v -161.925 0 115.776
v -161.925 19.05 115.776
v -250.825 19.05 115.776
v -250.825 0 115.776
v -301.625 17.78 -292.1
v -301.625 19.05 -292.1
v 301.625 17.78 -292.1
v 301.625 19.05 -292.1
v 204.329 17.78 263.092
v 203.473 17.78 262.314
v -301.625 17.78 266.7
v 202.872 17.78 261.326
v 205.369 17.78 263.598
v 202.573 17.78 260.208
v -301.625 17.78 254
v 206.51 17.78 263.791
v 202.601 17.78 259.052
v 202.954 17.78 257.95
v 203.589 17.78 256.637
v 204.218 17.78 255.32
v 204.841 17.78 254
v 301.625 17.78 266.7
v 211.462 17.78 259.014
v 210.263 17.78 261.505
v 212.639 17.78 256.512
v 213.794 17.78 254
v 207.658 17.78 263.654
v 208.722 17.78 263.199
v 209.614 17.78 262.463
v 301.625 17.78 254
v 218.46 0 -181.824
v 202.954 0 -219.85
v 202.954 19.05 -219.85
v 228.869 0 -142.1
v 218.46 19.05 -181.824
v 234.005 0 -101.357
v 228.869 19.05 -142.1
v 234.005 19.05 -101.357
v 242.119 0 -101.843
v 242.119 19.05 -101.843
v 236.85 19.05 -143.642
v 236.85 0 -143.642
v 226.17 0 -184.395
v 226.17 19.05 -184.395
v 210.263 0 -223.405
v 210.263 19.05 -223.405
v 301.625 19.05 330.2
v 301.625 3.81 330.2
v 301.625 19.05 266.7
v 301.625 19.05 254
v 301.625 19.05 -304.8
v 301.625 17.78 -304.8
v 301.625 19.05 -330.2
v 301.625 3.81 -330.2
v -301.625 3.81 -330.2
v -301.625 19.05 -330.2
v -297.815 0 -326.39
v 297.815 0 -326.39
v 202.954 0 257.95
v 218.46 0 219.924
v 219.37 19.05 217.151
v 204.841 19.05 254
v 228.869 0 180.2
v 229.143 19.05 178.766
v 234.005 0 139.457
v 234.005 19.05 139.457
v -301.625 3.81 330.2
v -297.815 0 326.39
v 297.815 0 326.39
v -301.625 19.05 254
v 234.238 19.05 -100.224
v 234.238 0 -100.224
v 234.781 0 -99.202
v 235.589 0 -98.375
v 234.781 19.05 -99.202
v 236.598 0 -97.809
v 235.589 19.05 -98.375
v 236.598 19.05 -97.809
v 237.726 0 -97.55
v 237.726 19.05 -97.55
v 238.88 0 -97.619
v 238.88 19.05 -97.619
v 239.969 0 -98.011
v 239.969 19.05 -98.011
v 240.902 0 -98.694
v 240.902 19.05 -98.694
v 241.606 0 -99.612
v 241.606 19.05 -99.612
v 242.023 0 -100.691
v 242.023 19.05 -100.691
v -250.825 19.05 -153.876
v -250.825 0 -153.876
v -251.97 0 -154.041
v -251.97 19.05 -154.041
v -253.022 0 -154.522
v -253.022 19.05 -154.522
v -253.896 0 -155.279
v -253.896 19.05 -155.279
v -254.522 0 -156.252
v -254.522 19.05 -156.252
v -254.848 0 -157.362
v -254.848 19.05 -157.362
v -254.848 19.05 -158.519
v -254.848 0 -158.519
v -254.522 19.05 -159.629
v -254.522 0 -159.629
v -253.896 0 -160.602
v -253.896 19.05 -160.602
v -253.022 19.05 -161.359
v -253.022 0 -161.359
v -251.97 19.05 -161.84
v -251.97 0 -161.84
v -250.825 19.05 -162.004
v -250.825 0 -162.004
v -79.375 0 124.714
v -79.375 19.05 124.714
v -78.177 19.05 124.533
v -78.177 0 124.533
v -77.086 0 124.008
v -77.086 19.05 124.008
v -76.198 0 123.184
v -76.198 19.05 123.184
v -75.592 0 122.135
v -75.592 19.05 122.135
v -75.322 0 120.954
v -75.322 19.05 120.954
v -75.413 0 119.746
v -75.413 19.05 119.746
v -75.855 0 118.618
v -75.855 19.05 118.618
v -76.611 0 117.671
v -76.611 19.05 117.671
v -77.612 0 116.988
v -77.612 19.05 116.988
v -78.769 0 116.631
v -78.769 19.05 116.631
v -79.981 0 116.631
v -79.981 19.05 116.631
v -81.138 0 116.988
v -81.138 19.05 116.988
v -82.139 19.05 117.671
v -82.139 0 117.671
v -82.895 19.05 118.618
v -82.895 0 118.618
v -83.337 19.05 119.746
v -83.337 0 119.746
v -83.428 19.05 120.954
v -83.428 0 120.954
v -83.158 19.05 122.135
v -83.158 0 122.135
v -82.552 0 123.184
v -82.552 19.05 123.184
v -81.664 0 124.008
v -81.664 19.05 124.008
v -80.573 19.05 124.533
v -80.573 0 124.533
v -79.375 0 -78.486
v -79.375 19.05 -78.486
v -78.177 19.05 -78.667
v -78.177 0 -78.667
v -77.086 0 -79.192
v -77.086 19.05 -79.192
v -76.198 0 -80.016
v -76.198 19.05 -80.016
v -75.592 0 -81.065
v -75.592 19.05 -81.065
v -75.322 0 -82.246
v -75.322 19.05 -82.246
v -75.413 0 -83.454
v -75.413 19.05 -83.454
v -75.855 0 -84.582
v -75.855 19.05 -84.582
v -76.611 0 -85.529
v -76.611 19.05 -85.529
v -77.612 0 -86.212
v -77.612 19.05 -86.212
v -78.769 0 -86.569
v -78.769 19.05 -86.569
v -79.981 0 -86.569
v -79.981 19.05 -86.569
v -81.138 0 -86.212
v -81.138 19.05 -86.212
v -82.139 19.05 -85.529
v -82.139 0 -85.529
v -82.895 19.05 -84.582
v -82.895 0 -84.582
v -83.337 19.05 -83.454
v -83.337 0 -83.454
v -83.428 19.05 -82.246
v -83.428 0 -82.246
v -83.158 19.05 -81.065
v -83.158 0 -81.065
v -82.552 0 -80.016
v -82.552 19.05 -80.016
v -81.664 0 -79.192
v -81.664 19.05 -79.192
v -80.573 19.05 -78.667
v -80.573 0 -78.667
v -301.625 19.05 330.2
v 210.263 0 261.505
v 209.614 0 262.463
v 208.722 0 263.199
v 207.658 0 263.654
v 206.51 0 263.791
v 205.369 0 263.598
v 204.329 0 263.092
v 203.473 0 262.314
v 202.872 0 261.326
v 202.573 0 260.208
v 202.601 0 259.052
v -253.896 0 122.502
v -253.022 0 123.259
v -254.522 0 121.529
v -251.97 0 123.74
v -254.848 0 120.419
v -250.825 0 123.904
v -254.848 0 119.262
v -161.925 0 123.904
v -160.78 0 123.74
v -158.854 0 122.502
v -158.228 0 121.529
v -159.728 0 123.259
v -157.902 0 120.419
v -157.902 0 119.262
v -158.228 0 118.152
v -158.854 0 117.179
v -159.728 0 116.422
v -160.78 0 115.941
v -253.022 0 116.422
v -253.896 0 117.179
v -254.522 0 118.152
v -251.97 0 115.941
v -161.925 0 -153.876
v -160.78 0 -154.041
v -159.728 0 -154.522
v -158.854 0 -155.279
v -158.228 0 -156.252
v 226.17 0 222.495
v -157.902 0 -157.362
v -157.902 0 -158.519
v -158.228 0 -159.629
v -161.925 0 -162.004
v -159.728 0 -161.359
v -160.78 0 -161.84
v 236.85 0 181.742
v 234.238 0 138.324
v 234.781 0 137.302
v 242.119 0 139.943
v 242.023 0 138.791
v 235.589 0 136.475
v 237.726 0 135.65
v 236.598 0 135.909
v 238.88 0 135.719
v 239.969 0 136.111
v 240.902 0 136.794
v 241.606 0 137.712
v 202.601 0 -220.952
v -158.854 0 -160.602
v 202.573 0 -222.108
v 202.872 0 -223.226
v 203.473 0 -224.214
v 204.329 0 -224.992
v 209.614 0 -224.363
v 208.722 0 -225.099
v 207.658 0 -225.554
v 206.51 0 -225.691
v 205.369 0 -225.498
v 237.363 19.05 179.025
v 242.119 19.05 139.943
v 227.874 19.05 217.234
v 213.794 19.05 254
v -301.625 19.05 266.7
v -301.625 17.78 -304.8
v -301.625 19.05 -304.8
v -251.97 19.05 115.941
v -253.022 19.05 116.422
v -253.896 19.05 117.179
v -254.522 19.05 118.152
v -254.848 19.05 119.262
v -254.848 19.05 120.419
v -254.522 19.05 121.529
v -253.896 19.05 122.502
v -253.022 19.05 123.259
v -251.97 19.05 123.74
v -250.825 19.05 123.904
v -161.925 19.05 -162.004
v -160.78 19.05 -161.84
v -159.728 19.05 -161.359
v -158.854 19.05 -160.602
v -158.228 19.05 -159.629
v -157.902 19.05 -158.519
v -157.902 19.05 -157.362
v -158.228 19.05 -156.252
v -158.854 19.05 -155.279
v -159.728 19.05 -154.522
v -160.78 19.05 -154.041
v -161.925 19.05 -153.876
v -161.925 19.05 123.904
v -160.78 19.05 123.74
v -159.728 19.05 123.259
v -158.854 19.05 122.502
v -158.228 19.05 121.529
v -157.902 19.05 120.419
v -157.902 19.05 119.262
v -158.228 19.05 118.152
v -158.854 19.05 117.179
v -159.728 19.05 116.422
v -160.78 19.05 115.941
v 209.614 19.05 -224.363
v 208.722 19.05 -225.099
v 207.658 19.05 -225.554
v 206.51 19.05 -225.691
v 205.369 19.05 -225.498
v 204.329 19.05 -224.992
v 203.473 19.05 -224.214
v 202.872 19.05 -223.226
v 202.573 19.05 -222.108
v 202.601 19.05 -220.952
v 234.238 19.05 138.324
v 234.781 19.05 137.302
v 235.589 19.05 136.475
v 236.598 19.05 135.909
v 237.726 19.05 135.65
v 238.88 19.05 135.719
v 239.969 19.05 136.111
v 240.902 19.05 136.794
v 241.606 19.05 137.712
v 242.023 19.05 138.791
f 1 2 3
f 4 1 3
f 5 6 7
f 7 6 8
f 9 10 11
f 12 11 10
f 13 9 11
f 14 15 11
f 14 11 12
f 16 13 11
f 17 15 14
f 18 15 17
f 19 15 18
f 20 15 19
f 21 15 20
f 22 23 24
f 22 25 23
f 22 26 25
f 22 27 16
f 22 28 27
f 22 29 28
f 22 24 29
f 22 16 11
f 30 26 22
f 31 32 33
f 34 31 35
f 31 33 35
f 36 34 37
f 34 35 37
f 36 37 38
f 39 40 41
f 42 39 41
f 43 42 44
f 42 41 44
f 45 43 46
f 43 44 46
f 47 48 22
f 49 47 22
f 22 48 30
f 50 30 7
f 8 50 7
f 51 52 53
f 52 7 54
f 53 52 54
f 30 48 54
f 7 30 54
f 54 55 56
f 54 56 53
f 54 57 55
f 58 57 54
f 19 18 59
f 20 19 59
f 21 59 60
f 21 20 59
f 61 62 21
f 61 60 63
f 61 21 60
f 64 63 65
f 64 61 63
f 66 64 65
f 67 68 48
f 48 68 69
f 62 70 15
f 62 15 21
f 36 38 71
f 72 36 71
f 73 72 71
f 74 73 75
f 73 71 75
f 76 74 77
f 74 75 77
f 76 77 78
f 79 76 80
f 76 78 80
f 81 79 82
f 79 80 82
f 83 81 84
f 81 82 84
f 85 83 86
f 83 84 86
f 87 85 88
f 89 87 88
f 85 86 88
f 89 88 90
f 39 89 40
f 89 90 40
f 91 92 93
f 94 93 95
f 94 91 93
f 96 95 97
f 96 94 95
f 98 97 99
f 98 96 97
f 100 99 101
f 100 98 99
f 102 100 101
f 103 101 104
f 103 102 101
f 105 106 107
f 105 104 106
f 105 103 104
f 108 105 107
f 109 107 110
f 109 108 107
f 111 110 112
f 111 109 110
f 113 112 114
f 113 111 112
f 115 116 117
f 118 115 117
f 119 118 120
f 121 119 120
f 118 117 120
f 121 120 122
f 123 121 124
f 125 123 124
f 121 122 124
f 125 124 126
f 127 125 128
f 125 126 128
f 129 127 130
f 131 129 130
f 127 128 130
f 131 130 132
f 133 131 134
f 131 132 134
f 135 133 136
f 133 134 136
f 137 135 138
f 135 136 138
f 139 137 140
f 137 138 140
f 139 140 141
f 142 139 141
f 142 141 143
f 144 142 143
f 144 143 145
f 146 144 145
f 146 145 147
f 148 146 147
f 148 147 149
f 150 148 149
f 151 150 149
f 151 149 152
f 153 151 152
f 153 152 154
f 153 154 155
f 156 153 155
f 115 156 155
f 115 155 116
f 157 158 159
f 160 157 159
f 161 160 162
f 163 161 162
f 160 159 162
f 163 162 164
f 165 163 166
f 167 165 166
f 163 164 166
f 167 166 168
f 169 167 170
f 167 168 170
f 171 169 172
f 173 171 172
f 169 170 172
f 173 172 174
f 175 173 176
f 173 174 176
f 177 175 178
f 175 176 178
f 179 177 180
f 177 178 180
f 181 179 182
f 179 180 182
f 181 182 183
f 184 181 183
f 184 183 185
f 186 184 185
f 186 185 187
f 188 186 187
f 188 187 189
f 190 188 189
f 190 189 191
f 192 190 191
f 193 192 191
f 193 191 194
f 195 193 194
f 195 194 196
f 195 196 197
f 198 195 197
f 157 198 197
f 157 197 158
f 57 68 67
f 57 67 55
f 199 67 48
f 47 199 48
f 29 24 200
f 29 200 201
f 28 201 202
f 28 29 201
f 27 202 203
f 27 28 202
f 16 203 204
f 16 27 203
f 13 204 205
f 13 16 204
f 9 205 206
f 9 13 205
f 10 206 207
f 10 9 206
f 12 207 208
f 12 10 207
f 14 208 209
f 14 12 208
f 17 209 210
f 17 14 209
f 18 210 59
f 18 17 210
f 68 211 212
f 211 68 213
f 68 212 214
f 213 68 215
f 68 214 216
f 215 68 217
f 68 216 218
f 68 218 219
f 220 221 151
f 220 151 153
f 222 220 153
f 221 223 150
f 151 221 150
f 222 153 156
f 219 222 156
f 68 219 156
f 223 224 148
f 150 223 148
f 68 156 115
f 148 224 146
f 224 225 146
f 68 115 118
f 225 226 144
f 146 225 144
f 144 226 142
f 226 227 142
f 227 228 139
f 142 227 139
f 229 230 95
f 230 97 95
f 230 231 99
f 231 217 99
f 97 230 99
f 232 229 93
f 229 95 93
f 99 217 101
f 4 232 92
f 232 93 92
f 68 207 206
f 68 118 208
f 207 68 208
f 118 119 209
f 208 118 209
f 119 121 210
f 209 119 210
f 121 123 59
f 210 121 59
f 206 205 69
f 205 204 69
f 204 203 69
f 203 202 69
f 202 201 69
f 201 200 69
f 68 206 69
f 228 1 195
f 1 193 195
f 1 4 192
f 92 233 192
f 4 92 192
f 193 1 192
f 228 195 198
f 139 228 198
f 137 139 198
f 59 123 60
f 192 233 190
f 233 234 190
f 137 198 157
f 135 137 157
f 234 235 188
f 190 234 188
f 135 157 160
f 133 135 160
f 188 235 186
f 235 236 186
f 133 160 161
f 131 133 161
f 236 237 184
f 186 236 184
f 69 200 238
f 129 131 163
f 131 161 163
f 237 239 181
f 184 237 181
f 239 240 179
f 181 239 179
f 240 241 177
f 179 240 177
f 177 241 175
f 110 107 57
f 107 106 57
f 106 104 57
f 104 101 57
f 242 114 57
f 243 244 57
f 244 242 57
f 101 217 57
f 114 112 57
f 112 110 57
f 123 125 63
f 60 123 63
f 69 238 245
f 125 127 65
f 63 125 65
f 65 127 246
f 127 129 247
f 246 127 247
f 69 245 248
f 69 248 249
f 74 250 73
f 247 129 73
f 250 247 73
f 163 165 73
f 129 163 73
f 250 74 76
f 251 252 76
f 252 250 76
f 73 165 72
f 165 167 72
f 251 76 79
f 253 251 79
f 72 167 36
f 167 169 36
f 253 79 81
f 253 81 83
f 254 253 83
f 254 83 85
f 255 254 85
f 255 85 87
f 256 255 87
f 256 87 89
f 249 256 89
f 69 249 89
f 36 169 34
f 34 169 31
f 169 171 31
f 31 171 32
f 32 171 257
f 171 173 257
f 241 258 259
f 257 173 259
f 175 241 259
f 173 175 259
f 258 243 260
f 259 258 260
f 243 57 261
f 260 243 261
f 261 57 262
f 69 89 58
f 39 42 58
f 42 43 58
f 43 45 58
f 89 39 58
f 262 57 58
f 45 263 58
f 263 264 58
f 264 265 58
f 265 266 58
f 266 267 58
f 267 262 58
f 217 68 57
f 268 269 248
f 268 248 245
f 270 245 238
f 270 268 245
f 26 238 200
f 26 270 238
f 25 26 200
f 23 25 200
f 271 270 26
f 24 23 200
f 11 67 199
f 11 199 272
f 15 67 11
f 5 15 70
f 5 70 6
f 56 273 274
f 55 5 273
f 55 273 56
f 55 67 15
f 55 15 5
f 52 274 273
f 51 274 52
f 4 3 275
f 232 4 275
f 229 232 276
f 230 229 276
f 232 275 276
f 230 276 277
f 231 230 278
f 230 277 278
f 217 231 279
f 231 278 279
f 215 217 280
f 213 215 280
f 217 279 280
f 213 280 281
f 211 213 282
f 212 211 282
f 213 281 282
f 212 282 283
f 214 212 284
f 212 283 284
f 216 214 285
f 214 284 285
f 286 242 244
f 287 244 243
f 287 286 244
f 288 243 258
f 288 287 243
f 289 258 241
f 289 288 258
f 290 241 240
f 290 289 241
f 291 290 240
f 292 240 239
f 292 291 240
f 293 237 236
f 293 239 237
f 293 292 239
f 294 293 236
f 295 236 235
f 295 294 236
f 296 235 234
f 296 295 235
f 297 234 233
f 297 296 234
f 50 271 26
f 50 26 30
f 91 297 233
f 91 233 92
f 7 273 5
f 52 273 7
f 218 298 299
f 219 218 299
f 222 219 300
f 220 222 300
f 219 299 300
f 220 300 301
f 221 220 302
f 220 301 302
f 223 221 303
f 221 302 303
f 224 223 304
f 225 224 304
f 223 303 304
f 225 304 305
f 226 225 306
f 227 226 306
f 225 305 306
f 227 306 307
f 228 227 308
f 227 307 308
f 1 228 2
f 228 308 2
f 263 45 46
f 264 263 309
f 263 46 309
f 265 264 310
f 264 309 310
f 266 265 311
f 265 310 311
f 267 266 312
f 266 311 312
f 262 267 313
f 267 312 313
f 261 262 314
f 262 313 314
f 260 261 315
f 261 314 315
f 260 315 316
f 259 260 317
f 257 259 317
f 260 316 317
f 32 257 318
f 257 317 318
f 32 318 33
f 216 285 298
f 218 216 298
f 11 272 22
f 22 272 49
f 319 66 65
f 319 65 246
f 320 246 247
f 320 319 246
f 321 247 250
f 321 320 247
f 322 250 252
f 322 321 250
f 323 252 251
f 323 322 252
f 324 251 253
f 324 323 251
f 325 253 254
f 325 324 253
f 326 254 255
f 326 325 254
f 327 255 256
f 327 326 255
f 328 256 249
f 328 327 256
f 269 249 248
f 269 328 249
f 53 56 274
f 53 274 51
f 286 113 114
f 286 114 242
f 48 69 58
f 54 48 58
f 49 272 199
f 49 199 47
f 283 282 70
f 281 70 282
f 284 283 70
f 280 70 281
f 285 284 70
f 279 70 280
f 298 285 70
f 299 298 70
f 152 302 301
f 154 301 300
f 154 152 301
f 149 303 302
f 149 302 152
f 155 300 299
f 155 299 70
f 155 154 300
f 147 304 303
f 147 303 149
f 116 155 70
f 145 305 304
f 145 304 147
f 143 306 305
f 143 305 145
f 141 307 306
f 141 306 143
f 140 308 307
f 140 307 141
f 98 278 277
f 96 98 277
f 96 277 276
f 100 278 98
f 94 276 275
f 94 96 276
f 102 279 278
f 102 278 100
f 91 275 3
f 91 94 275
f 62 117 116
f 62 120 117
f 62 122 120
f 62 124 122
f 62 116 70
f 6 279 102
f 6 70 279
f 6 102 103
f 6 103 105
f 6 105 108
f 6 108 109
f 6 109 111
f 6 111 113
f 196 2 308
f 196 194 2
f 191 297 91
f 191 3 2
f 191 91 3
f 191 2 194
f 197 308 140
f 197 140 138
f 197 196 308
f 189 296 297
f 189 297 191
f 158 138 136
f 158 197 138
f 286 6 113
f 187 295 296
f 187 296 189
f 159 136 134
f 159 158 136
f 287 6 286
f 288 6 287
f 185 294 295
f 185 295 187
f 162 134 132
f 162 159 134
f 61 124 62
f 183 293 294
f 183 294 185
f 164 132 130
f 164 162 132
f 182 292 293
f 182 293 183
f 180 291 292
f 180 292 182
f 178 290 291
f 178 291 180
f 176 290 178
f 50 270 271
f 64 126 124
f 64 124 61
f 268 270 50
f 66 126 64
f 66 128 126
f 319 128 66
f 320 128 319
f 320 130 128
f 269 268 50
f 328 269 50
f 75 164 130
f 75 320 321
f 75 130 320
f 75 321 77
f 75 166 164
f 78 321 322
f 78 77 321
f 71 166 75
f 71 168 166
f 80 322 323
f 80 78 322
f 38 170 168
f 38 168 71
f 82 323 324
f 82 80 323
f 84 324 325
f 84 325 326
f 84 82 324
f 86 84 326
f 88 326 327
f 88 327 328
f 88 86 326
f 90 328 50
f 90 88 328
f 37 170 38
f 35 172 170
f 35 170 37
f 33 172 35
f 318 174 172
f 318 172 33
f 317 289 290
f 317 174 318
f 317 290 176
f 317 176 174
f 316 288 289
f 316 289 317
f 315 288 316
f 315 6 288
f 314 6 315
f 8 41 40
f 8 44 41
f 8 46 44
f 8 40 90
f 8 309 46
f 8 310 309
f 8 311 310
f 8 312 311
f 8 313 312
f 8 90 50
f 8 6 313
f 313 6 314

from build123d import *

# Parameters (mm, degrees)
SKETCH1_W           = 603.25
SKETCH1_H           = 660.4
BOSS_EXTRUDE1_DEPTH = 19.05
CHAMFER1_SIZE       = 3.81
CUT_EXTRUDE2_DEPTH  = 448.629962274
SKETCH6_R           = 4.064
CUT_EXTRUDE5_DEPTH  = 448.629962274
CUT_EXTRUDE8_DEPTH  = 448.629962274
SKETCH10_W          = 603.25
SKETCH10_H          = 12.7
CUT_EXTRUDE9_DEPTH  = 1.27


with BuildPart() as part:
    # Sketch1 → Boss-Extrude1 (new body)
    with BuildSketch(Plane(origin=(0, 0, 0), x_dir=(1, 0, 0), z_dir=(0, 1, 0))):
        Rectangle(SKETCH1_W, SKETCH1_H)
    extrude(amount=BOSS_EXTRUDE1_DEPTH)

    # Chamfer1
    chamfer1_edges = [part.edges().sort_by_distance(p)[0] for p in [
        (0, 0, 330.2),
        (-301.625, 0, 0),
        (0, 0, -330.2),
        (301.625, 0, 0),
    ]]
    chamfer(chamfer1_edges, length=CHAMFER1_SIZE)

    # Sketch3 → Cut-Extrude2 (cut, through all)
    with BuildSketch(Plane(origin=(0, 19.05, 0), x_dir=(1, 0, 0), z_dir=(0, 1, 0))):
        with BuildLine():
            Line((-250.825, 162.004445849), (-161.925, 162.004445849))
            ThreePointArc((-161.925, 162.004445849), (-157.861, 157.940445849), (-161.925, 153.876445849))
            Line((-161.925, 153.876445849), (-250.825, 153.876445849))
            ThreePointArc((-250.825, 153.876445849), (-254.889, 157.940445849), (-250.825, 162.004445849))
        make_face()
        with BuildLine():
            Line((-250.825, -123.904445849), (-161.925, -123.904445849))
            ThreePointArc((-161.925, -123.904445849), (-157.861, -119.840445849), (-161.925, -115.776445849))
            Line((-161.925, -115.776445849), (-250.825, -115.776445849))
            ThreePointArc((-250.825, -115.776445849), (-254.889, -119.840445849), (-250.825, -123.904445849))
        make_face()
    extrude(amount=-CUT_EXTRUDE2_DEPTH, mode=Mode.SUBTRACT)

    # Sketch6 → Cut-Extrude5 (cut, through all)
    with BuildSketch(Plane(origin=(0, 19.05, 0), x_dir=(1, 0, 0), z_dir=(0, 1, 0))):
        with Locations(Location((-79.375, 82.55, 0), (0, 0, 270))):
            Circle(SKETCH6_R)
        with Locations(Location((-79.375, -120.65, 0), (0, 0, 270))):
            Circle(SKETCH6_R)
    extrude(amount=-CUT_EXTRUDE5_DEPTH, mode=Mode.SUBTRACT)

    # Sketch9 → Cut-Extrude8 (cut, through all)
    with BuildSketch(Plane(origin=(0, 19.05, 0), x_dir=(1, 0, 0), z_dir=(0, 1, 0))):
        with BuildLine():
            ThreePointArc((242.118601729, -139.943450479), (232.177226853, -202.293022526), (210.263074619, -261.505099002))
            ThreePointArc((210.263074619, -261.505099002), (204.8309841, -263.382486707), (202.953596395, -257.950396188))
            ThreePointArc((202.953596395, -257.950396188), (224.314710087, -200.23263079), (234.005198531, -139.456549521))
            ThreePointArc((234.005198531, -139.456549521), (238.305350609, -135.643298401), (242.118601729, -139.943450479))
        make_face()
        with BuildLine():
            ThreePointArc((242.118601729, 101.843450479), (232.177226853, 164.193022526), (210.263074619, 223.405099002))
            ThreePointArc((210.263074619, 223.405099002), (204.8309841, 225.282486707), (202.953596395, 219.850396188))
            ThreePointArc((202.953596395, 219.850396188), (224.314710087, 162.13263079), (234.005198531, 101.356549521))
            ThreePointArc((234.005198531, 101.356549521), (238.305350609, 97.543298401), (242.118601729, 101.843450479))
        make_face()
    extrude(amount=-CUT_EXTRUDE8_DEPTH, mode=Mode.SUBTRACT)

    # Sketch10 → Cut-Extrude9 (cut)
    with BuildSketch(Plane(origin=(0, 19.05, 0), x_dir=(1, 0, 0), z_dir=(0, 1, 0))):
        with Locations((0, 298.45)):
            Rectangle(SKETCH10_W, SKETCH10_H)
        with Locations((0, -260.35)):
            Rectangle(SKETCH10_W, SKETCH10_H)
    extrude(amount=-CUT_EXTRUDE9_DEPTH, mode=Mode.SUBTRACT)


solid = part.part
